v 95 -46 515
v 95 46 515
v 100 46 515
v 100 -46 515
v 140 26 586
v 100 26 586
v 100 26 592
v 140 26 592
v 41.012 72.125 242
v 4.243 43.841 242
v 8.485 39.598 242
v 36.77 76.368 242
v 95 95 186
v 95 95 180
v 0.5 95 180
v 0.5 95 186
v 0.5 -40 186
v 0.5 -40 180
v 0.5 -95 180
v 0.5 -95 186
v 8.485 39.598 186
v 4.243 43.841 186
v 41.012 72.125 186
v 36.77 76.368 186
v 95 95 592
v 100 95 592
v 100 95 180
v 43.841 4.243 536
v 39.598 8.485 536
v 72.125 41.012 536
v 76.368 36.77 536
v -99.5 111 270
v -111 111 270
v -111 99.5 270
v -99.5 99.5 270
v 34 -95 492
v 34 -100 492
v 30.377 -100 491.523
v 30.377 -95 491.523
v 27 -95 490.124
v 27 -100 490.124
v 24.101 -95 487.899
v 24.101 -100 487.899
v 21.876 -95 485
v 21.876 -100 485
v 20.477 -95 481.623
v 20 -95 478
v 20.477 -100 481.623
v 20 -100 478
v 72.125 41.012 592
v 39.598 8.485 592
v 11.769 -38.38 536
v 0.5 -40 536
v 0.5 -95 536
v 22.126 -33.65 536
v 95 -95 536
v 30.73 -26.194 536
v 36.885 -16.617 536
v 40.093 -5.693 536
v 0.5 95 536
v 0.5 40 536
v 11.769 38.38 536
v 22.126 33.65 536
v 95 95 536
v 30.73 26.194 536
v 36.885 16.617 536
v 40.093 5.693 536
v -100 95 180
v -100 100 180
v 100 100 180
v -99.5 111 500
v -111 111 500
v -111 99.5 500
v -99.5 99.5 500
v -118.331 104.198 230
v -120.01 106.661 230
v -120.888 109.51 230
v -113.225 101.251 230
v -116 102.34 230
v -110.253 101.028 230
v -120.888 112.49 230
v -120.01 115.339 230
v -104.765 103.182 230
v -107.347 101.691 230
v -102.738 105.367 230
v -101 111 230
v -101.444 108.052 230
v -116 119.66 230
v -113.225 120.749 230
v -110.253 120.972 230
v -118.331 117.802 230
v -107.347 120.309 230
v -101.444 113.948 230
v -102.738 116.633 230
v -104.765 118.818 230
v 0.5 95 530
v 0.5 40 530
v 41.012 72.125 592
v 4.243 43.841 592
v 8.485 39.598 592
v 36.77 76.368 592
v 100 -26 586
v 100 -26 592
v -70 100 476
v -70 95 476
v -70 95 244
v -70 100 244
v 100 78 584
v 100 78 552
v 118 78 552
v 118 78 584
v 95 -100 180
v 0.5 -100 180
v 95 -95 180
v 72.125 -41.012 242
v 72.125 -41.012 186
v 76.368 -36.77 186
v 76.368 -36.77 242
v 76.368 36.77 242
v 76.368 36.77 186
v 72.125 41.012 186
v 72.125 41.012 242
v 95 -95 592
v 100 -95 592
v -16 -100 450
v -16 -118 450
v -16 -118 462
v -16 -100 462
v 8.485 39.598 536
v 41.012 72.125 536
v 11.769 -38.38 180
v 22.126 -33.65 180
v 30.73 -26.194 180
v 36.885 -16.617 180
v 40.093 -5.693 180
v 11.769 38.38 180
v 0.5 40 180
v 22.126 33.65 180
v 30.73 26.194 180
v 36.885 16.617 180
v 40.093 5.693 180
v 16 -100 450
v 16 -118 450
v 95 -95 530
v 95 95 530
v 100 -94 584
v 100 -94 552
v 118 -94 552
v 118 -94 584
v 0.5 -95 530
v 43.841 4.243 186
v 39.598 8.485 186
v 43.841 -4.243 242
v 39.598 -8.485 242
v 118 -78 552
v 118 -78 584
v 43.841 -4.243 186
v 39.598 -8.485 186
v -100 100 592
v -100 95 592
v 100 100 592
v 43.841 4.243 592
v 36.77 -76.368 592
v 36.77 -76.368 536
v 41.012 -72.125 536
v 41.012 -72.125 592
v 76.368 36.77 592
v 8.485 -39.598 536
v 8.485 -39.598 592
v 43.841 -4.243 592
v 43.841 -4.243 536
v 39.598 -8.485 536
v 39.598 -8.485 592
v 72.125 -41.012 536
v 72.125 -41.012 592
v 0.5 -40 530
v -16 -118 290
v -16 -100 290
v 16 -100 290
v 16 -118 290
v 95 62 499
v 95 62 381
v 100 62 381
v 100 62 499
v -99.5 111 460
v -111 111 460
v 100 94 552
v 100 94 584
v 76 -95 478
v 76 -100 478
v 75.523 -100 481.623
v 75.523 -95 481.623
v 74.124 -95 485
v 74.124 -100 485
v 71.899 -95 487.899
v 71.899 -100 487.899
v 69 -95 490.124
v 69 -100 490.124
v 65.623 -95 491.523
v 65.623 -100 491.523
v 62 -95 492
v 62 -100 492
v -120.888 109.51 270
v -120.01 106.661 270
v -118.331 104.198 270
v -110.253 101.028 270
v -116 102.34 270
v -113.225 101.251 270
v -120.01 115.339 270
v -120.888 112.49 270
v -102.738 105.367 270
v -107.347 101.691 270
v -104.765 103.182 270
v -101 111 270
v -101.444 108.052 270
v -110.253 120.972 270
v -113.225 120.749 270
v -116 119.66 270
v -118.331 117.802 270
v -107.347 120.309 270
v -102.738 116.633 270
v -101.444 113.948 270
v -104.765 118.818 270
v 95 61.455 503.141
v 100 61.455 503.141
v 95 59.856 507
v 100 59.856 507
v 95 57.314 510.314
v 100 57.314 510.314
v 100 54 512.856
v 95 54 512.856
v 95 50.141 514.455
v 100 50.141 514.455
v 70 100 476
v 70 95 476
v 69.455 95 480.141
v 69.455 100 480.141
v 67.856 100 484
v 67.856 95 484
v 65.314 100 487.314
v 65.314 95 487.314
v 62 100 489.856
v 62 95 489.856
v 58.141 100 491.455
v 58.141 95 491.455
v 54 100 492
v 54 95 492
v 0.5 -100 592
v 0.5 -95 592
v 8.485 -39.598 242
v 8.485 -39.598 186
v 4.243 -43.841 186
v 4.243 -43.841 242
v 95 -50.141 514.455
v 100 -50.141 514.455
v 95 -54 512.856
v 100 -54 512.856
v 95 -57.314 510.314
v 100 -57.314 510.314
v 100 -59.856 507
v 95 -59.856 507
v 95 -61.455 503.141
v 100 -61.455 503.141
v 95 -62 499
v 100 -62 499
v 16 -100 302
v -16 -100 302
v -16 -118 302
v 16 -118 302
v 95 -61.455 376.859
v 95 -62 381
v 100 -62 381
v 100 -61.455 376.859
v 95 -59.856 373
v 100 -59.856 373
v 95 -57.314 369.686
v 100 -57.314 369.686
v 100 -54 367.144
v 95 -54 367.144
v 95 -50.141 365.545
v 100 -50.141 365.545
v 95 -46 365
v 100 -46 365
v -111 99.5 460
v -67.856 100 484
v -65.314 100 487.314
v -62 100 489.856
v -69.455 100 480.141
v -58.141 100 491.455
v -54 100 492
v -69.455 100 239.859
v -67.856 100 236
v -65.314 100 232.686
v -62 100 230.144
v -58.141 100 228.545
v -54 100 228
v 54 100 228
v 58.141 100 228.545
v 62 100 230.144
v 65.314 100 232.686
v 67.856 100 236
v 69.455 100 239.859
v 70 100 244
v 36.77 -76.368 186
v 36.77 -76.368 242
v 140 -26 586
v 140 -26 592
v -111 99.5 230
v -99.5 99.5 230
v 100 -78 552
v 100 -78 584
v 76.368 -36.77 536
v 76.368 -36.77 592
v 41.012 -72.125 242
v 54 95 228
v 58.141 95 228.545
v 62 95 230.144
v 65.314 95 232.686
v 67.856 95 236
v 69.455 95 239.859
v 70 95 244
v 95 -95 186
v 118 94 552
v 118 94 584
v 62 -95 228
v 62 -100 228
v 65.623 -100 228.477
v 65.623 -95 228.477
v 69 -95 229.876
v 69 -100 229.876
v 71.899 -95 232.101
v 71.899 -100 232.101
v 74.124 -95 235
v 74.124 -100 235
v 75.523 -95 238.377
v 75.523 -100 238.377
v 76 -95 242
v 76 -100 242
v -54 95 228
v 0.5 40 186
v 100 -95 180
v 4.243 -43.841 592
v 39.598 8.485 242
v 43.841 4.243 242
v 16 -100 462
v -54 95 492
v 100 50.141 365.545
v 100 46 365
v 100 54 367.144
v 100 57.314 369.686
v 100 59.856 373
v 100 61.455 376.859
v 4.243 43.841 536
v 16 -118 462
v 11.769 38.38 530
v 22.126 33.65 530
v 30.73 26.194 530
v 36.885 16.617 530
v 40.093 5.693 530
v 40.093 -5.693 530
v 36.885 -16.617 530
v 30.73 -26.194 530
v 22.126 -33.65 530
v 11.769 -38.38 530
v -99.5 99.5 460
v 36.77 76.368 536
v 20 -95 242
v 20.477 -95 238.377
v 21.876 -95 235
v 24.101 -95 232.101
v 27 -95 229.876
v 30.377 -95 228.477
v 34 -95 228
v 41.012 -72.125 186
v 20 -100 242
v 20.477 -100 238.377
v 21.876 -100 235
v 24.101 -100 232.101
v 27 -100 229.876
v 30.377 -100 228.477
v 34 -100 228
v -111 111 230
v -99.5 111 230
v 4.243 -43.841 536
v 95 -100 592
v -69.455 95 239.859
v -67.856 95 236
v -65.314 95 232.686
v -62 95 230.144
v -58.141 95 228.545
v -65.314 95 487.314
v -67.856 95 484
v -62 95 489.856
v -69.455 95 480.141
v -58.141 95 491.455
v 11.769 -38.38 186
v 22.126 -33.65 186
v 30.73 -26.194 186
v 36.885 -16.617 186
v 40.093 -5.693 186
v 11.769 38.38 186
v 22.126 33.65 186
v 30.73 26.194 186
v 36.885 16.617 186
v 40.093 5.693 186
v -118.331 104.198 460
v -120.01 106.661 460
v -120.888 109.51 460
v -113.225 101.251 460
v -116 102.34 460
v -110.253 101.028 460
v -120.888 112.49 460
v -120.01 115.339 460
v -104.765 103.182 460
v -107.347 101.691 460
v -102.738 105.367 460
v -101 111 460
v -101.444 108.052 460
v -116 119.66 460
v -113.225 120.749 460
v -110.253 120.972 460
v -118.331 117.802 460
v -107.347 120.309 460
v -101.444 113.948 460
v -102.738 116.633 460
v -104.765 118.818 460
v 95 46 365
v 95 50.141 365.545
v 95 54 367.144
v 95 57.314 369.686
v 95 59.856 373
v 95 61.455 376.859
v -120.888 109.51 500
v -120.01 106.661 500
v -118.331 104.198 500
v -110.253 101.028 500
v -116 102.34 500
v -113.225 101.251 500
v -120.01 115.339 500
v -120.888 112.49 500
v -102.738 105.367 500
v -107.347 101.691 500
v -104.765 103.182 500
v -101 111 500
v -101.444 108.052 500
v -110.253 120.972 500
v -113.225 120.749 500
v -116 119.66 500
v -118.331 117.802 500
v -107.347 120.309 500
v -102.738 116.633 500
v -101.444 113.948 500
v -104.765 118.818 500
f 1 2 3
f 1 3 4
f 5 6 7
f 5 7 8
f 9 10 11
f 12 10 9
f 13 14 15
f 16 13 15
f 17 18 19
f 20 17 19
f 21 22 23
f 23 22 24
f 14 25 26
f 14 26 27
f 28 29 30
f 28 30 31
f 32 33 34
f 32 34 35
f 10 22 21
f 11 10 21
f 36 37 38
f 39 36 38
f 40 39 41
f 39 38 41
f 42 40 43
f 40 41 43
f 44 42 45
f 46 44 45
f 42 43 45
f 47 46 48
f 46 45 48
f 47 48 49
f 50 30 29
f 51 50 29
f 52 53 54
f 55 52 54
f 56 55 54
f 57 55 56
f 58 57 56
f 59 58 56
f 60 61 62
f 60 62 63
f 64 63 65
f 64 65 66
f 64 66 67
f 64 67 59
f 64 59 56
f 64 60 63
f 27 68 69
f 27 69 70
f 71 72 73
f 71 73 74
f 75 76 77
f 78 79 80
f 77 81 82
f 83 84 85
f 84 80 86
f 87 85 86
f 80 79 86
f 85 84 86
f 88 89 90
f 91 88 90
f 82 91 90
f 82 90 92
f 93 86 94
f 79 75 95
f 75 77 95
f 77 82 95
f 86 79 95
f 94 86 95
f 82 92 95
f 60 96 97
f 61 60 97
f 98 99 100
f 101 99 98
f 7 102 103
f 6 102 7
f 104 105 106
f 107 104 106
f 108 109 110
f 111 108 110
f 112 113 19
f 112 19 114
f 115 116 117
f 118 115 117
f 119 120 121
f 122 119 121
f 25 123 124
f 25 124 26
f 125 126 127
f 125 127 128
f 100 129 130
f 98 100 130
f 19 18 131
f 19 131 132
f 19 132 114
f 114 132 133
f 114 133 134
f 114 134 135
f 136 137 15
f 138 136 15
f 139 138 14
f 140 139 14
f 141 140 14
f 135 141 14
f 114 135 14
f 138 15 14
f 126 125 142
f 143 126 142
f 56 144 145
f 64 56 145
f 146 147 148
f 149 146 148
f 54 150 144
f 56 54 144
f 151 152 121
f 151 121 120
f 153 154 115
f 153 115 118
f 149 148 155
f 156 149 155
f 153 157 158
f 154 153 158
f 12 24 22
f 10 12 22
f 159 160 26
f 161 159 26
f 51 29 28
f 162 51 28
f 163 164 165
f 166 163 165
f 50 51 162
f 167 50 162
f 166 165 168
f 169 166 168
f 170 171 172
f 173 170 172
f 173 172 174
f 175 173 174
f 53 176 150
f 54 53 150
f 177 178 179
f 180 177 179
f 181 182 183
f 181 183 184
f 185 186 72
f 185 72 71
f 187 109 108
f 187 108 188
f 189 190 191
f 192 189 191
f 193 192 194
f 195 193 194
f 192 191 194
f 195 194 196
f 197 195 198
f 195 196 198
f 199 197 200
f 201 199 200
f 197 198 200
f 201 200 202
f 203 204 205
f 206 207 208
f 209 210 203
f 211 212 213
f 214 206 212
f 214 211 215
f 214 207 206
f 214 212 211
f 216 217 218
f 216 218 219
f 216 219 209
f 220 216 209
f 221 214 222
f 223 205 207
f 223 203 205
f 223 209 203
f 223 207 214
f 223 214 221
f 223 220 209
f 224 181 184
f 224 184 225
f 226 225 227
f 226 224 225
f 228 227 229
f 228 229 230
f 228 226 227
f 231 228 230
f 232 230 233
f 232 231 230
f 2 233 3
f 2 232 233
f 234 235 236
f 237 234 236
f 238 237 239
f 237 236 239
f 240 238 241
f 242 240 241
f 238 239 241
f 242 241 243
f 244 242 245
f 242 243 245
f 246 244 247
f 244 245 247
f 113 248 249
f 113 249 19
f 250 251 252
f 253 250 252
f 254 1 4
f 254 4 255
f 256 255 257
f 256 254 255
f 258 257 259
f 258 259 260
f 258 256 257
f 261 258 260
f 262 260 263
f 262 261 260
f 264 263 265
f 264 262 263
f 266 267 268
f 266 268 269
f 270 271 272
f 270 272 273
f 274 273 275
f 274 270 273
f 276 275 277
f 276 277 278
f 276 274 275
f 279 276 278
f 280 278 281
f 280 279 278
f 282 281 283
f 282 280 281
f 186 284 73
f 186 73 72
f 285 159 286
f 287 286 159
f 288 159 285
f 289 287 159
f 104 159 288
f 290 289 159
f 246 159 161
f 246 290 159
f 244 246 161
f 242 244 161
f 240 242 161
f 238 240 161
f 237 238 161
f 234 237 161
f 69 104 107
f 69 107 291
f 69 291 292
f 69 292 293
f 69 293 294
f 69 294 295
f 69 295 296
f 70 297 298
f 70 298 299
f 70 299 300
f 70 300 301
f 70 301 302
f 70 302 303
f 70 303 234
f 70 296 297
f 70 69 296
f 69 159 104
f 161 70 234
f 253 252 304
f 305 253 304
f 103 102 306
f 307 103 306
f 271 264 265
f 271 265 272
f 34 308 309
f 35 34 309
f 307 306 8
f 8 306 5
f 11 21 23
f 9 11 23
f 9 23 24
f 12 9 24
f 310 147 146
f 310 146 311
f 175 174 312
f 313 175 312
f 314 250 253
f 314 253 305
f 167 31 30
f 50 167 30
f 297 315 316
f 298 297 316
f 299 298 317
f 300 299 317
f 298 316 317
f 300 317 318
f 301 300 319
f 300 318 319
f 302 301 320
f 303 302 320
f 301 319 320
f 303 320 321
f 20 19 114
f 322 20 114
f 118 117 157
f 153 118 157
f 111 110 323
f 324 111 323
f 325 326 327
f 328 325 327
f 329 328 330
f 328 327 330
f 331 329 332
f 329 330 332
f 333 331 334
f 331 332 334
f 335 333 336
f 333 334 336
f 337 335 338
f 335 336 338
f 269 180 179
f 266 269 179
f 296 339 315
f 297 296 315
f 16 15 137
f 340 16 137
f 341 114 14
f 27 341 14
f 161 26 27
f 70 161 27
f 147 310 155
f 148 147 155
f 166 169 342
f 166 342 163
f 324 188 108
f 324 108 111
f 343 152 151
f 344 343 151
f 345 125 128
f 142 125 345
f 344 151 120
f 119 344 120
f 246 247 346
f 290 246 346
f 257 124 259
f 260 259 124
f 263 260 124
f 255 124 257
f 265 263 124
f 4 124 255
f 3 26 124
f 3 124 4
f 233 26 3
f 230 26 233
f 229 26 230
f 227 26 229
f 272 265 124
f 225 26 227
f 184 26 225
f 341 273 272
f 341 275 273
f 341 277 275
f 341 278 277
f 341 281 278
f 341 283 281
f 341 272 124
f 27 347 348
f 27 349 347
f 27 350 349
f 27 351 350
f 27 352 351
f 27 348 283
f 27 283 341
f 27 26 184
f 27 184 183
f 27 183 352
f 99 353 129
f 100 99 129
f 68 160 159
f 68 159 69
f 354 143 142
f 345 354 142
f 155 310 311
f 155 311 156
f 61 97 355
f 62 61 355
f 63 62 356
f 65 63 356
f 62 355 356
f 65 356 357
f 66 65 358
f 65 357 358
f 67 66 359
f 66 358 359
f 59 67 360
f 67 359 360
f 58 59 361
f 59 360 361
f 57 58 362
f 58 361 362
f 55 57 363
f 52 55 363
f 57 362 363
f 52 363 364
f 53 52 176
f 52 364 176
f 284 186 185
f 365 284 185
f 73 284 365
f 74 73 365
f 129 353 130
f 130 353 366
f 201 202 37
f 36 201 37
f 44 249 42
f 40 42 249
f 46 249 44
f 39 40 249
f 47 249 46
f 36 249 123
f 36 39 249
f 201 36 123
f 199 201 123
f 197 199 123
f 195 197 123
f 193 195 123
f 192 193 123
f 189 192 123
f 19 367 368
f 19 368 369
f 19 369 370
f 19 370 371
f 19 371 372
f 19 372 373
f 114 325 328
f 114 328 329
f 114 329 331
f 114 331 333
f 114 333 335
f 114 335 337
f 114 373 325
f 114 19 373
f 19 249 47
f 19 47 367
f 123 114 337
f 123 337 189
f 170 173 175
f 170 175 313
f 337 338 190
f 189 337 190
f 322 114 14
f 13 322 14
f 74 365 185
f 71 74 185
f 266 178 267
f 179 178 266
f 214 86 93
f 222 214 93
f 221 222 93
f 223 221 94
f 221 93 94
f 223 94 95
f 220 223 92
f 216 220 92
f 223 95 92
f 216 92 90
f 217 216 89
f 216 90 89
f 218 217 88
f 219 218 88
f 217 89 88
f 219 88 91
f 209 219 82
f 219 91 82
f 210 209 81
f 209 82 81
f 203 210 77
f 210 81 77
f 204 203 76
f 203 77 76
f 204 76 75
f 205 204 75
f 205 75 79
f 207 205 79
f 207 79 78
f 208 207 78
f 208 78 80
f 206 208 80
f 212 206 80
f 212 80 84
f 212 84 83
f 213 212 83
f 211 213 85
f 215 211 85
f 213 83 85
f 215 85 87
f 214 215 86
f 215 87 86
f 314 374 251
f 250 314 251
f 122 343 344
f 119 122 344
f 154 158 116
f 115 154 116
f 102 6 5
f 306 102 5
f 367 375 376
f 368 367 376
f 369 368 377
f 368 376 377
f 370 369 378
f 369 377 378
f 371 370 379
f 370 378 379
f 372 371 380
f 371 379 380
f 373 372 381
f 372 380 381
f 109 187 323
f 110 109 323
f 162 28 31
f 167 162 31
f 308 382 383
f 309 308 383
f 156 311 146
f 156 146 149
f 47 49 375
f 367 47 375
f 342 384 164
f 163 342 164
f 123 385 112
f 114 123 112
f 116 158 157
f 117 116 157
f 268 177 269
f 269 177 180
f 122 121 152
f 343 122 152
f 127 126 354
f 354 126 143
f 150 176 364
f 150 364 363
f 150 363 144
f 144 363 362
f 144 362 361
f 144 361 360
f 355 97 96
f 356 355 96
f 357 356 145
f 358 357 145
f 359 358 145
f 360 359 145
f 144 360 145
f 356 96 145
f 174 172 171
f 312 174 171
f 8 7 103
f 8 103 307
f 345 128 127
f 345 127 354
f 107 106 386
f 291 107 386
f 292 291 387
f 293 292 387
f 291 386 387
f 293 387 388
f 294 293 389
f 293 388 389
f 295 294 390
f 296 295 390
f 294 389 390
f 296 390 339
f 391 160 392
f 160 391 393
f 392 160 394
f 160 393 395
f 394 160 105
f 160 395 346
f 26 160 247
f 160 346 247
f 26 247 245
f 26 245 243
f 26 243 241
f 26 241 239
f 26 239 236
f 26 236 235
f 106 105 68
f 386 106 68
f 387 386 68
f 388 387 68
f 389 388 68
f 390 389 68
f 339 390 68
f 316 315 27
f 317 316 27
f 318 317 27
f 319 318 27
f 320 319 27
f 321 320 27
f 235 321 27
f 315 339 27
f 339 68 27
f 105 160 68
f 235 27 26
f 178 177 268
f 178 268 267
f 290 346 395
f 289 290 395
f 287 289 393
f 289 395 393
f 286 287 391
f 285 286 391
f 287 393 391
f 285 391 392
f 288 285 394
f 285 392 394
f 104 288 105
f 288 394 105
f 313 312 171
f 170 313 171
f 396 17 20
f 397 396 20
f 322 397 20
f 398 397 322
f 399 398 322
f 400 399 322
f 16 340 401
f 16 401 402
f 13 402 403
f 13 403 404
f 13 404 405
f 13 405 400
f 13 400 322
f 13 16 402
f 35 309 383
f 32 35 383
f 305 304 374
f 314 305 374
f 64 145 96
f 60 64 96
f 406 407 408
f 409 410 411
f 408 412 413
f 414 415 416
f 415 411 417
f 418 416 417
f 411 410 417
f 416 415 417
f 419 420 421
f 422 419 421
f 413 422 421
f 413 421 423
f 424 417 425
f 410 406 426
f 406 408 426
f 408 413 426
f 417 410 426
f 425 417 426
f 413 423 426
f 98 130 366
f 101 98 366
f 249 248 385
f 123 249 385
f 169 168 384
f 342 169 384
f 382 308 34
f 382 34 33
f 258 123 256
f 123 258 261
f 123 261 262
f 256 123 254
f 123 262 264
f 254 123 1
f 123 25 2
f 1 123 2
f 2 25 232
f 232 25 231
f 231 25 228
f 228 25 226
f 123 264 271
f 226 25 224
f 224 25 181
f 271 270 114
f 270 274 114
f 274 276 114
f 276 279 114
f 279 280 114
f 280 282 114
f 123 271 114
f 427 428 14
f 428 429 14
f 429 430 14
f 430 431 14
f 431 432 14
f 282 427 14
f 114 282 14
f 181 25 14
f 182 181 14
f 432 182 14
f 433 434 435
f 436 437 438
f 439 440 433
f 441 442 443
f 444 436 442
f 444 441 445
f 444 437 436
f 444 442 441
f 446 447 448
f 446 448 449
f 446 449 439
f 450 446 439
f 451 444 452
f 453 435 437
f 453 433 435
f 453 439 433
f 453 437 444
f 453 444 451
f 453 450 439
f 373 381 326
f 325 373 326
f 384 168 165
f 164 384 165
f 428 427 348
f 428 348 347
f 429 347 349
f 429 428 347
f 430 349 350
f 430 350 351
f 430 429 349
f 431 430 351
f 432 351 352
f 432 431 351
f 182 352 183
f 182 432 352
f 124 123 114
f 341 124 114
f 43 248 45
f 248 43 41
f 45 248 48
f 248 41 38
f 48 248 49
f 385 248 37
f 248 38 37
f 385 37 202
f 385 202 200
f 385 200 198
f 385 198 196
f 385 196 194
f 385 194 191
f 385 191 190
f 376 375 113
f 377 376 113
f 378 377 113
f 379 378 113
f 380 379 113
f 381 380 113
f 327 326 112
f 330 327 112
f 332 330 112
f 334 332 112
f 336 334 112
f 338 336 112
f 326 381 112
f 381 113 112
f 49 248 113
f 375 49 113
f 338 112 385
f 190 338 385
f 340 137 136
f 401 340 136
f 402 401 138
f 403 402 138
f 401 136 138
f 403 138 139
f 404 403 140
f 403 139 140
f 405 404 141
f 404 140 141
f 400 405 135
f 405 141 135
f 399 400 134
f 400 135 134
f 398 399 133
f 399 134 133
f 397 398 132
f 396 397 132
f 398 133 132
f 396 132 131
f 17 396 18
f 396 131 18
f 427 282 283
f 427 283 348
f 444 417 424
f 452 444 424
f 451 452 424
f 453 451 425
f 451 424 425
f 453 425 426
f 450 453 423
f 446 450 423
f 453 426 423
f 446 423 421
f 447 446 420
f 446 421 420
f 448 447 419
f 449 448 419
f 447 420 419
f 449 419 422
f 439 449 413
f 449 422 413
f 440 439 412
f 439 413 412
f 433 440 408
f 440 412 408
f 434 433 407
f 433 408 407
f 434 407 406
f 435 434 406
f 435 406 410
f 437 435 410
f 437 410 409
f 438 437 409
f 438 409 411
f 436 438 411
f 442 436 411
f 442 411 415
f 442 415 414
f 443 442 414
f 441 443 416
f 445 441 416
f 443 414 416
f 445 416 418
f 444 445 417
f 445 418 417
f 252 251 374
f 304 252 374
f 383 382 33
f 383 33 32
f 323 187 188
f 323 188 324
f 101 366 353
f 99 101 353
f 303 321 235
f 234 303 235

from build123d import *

# Parameters (mm, degrees)
EXTRUDE_START       = 180
EXTRUDE_1_DEPTH     = 6
EXTRUDE_START_2     = 186
EXTRUDE_2_DEPTH     = 56
EXTRUDE_3_DEPTH     = 56
EXTRUDE_4_DEPTH     = 56
EXTRUDE_5_DEPTH     = 56
EXTRUDE_START_3     = 530
EXTRUDE_6_DEPTH     = 6
EXTRUDE_START_4     = 536
EXTRUDE_7_DEPTH     = 56
EXTRUDE_8_DEPTH     = 56
EXTRUDE_9_DEPTH     = 56
EXTRUDE_10_DEPTH    = 56
EXTRUDE_START_5     = 95
EXTRUDE_SKETCH_11_W = 412
EXTRUDE_SKETCH_11_H = 190
EXTRUDE_11_DEPTH    = 5
EXTRUDE_SKETCH_12_W = 200
EXTRUDE_SKETCH_12_H = 412
EXTRUDE_12_DEPTH    = 5
EXTRUDE_START_6     = -100
EXTRUDE_SKETCH_13_W = 94.5
EXTRUDE_SKETCH_13_H = 412
EXTRUDE_13_DEPTH    = 5
EXTRUDE_START_7     = 230
EXTRUDE_SKETCH_14_R = 10
EXTRUDE_14_DEPTH    = 40
EXTRUDE_SKETCH_15_W = 11.5
EXTRUDE_SKETCH_15_H = 11.5
EXTRUDE_15_DEPTH    = 40
EXTRUDE_START_8     = 460
EXTRUDE_SKETCH_16_R = 10
EXTRUDE_16_DEPTH    = 40
EXTRUDE_SKETCH_17_W = 11.5
EXTRUDE_SKETCH_17_H = 11.5
EXTRUDE_17_DEPTH    = 40
EXTRUDE_START_9     = 290
EXTRUDE_SKETCH_18_W = 32
EXTRUDE_SKETCH_18_H = 18
EXTRUDE_18_DEPTH    = 12
EXTRUDE_START_10    = 450
EXTRUDE_SKETCH_19_W = 32
EXTRUDE_SKETCH_19_H = 18
EXTRUDE_19_DEPTH    = 12
EXTRUDE_START_11    = 586
EXTRUDE_SKETCH_20_W = 40
EXTRUDE_SKETCH_20_H = 52
EXTRUDE_20_DEPTH    = 6
EXTRUDE_START_12    = 552
EXTRUDE_SKETCH_21_W = 18
EXTRUDE_SKETCH_21_H = 16
EXTRUDE_21_DEPTH    = 32
EXTRUDE_SKETCH_22_W = 18
EXTRUDE_SKETCH_22_H = 16
EXTRUDE_22_DEPTH    = 32


with BuildPart() as part:
    # Extrude sketch 1 → Extrude 1 (new body)
    with BuildSketch(Plane.XY.offset(EXTRUDE_START)):
        with BuildLine():
            Line((95, -95), (95, 95))
            Line((95, 95), (0.5, 95))
            Line((0.5, 95), (0.5, 40))
            ThreePointArc((0.5, 40), (40.5, 0), (0.5, -40))
            Line((0.5, -40), (0.5, -95))
            Line((0.5, -95), (95, -95))
        make_face()
    extrude(amount=EXTRUDE_1_DEPTH)


with BuildPart() as body_2:
    # Extrude sketch 2 → Extrude 2 (new body)
    with BuildSketch(Plane.XY.offset(EXTRUDE_START_2)):
        Polygon((8.485281374, 39.597979746), (41.012193309, 72.124891681), (36.769552622, 76.367532368), (4.242640687, 43.840620434), align=None)
    extrude(amount=EXTRUDE_2_DEPTH)


with BuildPart() as body_3:
    # Extrude sketch 3 → Extrude 3 (new body)
    with BuildSketch(Plane.XY.offset(EXTRUDE_START_2)):
        Polygon((72.124891681, 41.012193309), (39.597979746, 8.485281374), (43.840620434, 4.242640687), (76.367532368, 36.769552622), align=None)
    extrude(amount=EXTRUDE_3_DEPTH)


with BuildPart() as body_4:
    # Extrude sketch 4 → Extrude 4 (new body)
    with BuildSketch(Plane.XY.offset(EXTRUDE_START_2)):
        Polygon((39.597979746, -8.485281374), (72.124891681, -41.012193309), (76.367532368, -36.769552622), (43.840620434, -4.242640687), align=None)
    extrude(amount=EXTRUDE_4_DEPTH)


with BuildPart() as body_5:
    # Extrude sketch 5 → Extrude 5 (new body)
    with BuildSketch(Plane.XY.offset(EXTRUDE_START_2)):
        Polygon((41.012193309, -72.124891681), (8.485281374, -39.597979746), (4.242640687, -43.840620434), (36.769552622, -76.367532368), align=None)
    extrude(amount=EXTRUDE_5_DEPTH)


with BuildPart() as body_6:
    # Extrude sketch 6 → Extrude 6 (new body)
    with BuildSketch(Plane.XY.offset(EXTRUDE_START_3)):
        with BuildLine():
            Line((95, -95), (95, 95))
            Line((95, 95), (0.5, 95))
            Line((0.5, 95), (0.5, 40))
            ThreePointArc((0.5, 40), (40.5, 0), (0.5, -40))
            Line((0.5, -40), (0.5, -95))
            Line((0.5, -95), (95, -95))
        make_face()
    extrude(amount=EXTRUDE_6_DEPTH)


with BuildPart() as body_7:
    # Extrude sketch 7 → Extrude 7 (new body)
    with BuildSketch(Plane.XY.offset(EXTRUDE_START_4)):
        Polygon((8.485281374, 39.597979746), (41.012193309, 72.124891681), (36.769552622, 76.367532368), (4.242640687, 43.840620434), align=None)
    extrude(amount=EXTRUDE_7_DEPTH)


with BuildPart() as body_8:
    # Extrude sketch 8 → Extrude 8 (new body)
    with BuildSketch(Plane.XY.offset(EXTRUDE_START_4)):
        Polygon((72.124891681, 41.012193309), (39.597979746, 8.485281374), (43.840620434, 4.242640687), (76.367532368, 36.769552622), align=None)
    extrude(amount=EXTRUDE_8_DEPTH)


with BuildPart() as body_9:
    # Extrude sketch 9 → Extrude 9 (new body)
    with BuildSketch(Plane.XY.offset(EXTRUDE_START_4)):
        Polygon((39.597979746, -8.485281374), (72.124891681, -41.012193309), (76.367532368, -36.769552622), (43.840620434, -4.242640687), align=None)
    extrude(amount=EXTRUDE_9_DEPTH)


with BuildPart() as body_10:
    # Extrude sketch 10 → Extrude 10 (new body)
    with BuildSketch(Plane.XY.offset(EXTRUDE_START_4)):
        Polygon((41.012193309, -72.124891681), (8.485281374, -39.597979746), (4.242640687, -43.840620434), (36.769552622, -76.367532368), align=None)
    extrude(amount=EXTRUDE_10_DEPTH)


with BuildPart() as body_11:
    # Extrude sketch 11 → Extrude 11 (new body)
    with BuildSketch(Plane(origin=(0, 0, 0), x_dir=(0, 0, -1), z_dir=(1, 0, 0)).offset(EXTRUDE_START_5)):
        with Locations((-386, 0)):
            Rectangle(EXTRUDE_SKETCH_11_W, EXTRUDE_SKETCH_11_H)
        with BuildLine():
            Line((-381, 62), (-499, 62))
            ThreePointArc((-499, 62), (-510.313708499, 57.313708499), (-515, 46))
            Line((-515, 46), (-515, -46))
            ThreePointArc((-515, -46), (-510.313708499, -57.313708499), (-499, -62))
            Line((-499, -62), (-381, -62))
            ThreePointArc((-381, -62), (-369.686291501, -57.313708499), (-365, -46))
            Line((-365, -46), (-365, 46))
            ThreePointArc((-365, 46), (-369.686291501, 57.313708499), (-381, 62))
        make_face(mode=Mode.SUBTRACT)
    extrude(amount=EXTRUDE_11_DEPTH)


with BuildPart() as body_12:
    # Extrude sketch 12 → Extrude 12 (new body)
    with BuildSketch(Plane(origin=(0, 0, 0), x_dir=(1, 0, 0), z_dir=(0, 1, 0)).offset(EXTRUDE_START_5)):
        with Locations((0, -386)):
            Rectangle(EXTRUDE_SKETCH_12_W, EXTRUDE_SKETCH_12_H)
        with BuildLine():
            Line((70, -244), (70, -476))
            ThreePointArc((70, -476), (65.313708499, -487.313708499), (54, -492))
            Line((54, -492), (-54, -492))
            ThreePointArc((-54, -492), (-65.313708499, -487.313708499), (-70, -476))
            Line((-70, -476), (-70, -244))
            ThreePointArc((-70, -244), (-65.313708499, -232.686291501), (-54, -228))
            Line((-54, -228), (54, -228))
            ThreePointArc((54, -228), (65.313708499, -232.686291501), (70, -244))
        make_face(mode=Mode.SUBTRACT)
    extrude(amount=EXTRUDE_12_DEPTH)


with BuildPart() as body_13:
    # Extrude sketch 13 → Extrude 13 (new body)
    with BuildSketch(Plane(origin=(0, 0, 0), x_dir=(1, 0, 0), z_dir=(0, 1, 0)).offset(EXTRUDE_START_6)):
        with Locations((47.75, -386)):
            Rectangle(EXTRUDE_SKETCH_13_W, EXTRUDE_SKETCH_13_H)
        with BuildLine():
            Line((76, -242), (76, -478))
            ThreePointArc((76, -478), (71.899494937, -487.899494937), (62, -492))
            Line((62, -492), (34, -492))
            ThreePointArc((34, -492), (24.100505063, -487.899494937), (20, -478))
            Line((20, -478), (20, -242))
            ThreePointArc((20, -242), (24.100505063, -232.100505063), (34, -228))
            Line((34, -228), (62, -228))
            ThreePointArc((62, -228), (71.899494937, -232.100505063), (76, -242))
        make_face(mode=Mode.SUBTRACT)
    extrude(amount=EXTRUDE_13_DEPTH)


with BuildPart() as body_14:
    # Extrude sketch 14 → Extrude 14 (new body)
    with BuildSketch(Plane.XY.offset(EXTRUDE_START_7)):
        with Locations((-111, 111)):
            Circle(EXTRUDE_SKETCH_14_R)
    extrude(amount=EXTRUDE_14_DEPTH)


with BuildPart() as body_15:
    # Extrude sketch 15 → Extrude 15 (new body)
    with BuildSketch(Plane.XY.offset(EXTRUDE_START_7)):
        with Locations((-105.25, 105.25)):
            Rectangle(EXTRUDE_SKETCH_15_W, EXTRUDE_SKETCH_15_H)
    extrude(amount=EXTRUDE_15_DEPTH)


with BuildPart() as body_16:
    # Extrude sketch 16 → Extrude 16 (new body)
    with BuildSketch(Plane.XY.offset(EXTRUDE_START_8)):
        with Locations((-111, 111)):
            Circle(EXTRUDE_SKETCH_16_R)
    extrude(amount=EXTRUDE_16_DEPTH)


with BuildPart() as body_17:
    # Extrude sketch 17 → Extrude 17 (new body)
    with BuildSketch(Plane.XY.offset(EXTRUDE_START_8)):
        with Locations((-105.25, 105.25)):
            Rectangle(EXTRUDE_SKETCH_17_W, EXTRUDE_SKETCH_17_H)
    extrude(amount=EXTRUDE_17_DEPTH)


with BuildPart() as body_18:
    # Extrude sketch 18 → Extrude 18 (new body)
    with BuildSketch(Plane.XY.offset(EXTRUDE_START_9)):
        with Locations((0, -109)):
            Rectangle(EXTRUDE_SKETCH_18_W, EXTRUDE_SKETCH_18_H)
    extrude(amount=EXTRUDE_18_DEPTH)


with BuildPart() as body_19:
    # Extrude sketch 19 → Extrude 19 (new body)
    with BuildSketch(Plane.XY.offset(EXTRUDE_START_10)):
        with Locations((0, -109)):
            Rectangle(EXTRUDE_SKETCH_19_W, EXTRUDE_SKETCH_19_H)
    extrude(amount=EXTRUDE_19_DEPTH)


with BuildPart() as body_20:
    # Extrude sketch 20 → Extrude 20 (new body)
    with BuildSketch(Plane.XY.offset(EXTRUDE_START_11)):
        with Locations((120, 0)):
            Rectangle(EXTRUDE_SKETCH_20_W, EXTRUDE_SKETCH_20_H)
    extrude(amount=EXTRUDE_20_DEPTH)


with BuildPart() as body_21:
    # Extrude sketch 21 → Extrude 21 (new body)
    with BuildSketch(Plane.XY.offset(EXTRUDE_START_12)):
        with Locations((109, 86)):
            Rectangle(EXTRUDE_SKETCH_21_W, EXTRUDE_SKETCH_21_H)
    extrude(amount=EXTRUDE_21_DEPTH)


with BuildPart() as body_22:
    # Extrude sketch 22 → Extrude 22 (new body)
    with BuildSketch(Plane.XY.offset(EXTRUDE_START_12)):
        with Locations((109, -86)):
            Rectangle(EXTRUDE_SKETCH_22_W, EXTRUDE_SKETCH_22_H)
    extrude(amount=EXTRUDE_22_DEPTH)


solid = Compound([part.part, body_2.part, body_3.part, body_4.part, body_5.part, body_6.part, body_7.part, body_8.part, body_9.part, body_10.part, body_11.part, body_12.part, body_13.part, body_14.part, body_15.part, body_16.part, body_17.part, body_18.part, body_19.part, body_20.part, body_21.part, body_22.part])
